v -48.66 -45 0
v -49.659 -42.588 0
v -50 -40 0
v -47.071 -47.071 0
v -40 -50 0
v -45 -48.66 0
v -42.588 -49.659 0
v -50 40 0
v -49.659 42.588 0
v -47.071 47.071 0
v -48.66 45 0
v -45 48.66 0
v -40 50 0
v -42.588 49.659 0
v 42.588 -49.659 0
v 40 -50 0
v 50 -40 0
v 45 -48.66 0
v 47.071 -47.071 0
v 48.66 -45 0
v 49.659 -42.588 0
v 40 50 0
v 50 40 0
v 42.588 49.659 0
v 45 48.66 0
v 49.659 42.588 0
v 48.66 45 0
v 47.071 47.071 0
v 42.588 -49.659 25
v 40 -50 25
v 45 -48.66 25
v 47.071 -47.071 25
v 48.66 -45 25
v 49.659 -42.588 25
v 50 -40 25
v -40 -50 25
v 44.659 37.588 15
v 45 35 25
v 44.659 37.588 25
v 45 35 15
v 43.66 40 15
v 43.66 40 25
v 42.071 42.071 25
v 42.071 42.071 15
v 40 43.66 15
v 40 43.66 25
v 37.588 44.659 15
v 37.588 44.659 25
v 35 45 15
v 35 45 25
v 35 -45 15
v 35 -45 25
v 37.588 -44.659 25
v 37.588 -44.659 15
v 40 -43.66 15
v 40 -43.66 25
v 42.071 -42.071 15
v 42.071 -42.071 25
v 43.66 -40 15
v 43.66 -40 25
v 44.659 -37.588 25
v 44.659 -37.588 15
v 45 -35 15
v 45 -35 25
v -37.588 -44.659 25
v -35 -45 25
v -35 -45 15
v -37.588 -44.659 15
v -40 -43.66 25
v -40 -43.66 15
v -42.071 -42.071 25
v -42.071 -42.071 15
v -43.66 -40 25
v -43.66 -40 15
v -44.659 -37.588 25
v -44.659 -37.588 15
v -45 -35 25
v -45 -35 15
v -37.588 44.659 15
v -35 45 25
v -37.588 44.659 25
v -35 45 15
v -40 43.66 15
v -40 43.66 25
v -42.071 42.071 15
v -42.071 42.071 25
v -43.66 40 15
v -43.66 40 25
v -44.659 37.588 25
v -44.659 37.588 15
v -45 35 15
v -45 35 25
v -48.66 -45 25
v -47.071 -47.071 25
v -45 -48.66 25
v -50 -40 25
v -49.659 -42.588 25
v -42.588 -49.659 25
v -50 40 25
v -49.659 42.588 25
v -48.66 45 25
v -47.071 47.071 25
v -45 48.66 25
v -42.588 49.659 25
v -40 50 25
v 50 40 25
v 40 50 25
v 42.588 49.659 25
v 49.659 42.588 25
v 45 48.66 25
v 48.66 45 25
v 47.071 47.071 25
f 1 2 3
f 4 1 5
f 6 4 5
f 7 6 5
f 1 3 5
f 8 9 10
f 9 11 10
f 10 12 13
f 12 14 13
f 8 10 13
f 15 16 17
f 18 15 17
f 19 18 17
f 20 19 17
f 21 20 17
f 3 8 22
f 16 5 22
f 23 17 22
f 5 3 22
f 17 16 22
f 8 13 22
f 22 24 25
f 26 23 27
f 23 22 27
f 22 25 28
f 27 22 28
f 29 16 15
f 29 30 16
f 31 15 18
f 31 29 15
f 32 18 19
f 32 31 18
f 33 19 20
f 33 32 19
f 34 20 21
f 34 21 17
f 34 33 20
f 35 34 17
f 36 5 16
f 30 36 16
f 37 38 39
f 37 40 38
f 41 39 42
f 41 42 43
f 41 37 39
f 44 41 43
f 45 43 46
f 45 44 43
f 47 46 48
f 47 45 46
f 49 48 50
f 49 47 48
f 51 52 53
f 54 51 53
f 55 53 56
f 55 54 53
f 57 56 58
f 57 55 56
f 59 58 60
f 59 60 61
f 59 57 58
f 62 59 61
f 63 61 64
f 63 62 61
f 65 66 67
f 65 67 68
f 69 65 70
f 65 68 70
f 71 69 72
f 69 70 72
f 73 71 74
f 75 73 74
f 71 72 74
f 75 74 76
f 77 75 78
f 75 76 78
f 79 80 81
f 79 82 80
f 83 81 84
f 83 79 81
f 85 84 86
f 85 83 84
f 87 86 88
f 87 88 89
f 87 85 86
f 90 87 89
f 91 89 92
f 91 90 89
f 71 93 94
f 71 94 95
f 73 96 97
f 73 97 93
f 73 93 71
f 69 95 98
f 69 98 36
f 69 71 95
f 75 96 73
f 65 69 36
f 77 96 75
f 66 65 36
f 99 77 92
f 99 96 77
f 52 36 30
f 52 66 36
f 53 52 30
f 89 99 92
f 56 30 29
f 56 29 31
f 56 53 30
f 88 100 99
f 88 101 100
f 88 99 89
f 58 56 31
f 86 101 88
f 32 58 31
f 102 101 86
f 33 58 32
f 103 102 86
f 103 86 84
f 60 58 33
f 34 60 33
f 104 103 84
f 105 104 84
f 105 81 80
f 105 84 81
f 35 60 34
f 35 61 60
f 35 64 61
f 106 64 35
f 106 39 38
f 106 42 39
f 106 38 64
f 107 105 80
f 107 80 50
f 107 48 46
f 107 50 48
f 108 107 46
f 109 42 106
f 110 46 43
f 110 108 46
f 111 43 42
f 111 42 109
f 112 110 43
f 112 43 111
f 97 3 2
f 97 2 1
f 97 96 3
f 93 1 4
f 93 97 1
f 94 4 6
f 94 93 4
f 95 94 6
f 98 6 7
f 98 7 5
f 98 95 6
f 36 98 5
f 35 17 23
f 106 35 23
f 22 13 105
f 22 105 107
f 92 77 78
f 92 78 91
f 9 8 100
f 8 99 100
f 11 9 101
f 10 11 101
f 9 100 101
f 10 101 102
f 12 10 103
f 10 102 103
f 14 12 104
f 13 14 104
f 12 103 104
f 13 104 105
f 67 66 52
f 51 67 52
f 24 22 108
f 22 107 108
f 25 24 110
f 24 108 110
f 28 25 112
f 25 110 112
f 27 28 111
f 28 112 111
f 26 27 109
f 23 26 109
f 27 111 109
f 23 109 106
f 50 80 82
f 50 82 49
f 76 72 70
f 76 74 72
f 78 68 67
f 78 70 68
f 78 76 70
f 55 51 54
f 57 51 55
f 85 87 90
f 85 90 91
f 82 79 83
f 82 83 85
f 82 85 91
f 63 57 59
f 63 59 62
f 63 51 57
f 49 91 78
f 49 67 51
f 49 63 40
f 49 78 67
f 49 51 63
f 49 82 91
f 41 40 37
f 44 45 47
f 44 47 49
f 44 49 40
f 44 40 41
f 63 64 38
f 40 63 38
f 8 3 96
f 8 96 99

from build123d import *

# Parameters (mm, degrees)
F0_W     = 100
F0_H     = 100
F1_DEPTH = 25
F2_W     = 90
F2_H     = 90
F3_DEPTH = 10
F4_R     = 10


with BuildPart() as f1:
    # F0 (on Top) → F1 (new body)
    with BuildSketch(Plane.XY):
        Rectangle(F0_W, F0_H)
    extrude(amount=F1_DEPTH)

    # F2 (on face) → F3 (cut)
    with BuildSketch(Plane.XY.offset(25)):
        Rectangle(F2_W, F2_H)
    extrude(amount=-F3_DEPTH, mode=Mode.SUBTRACT)

    # F4
    f4_edges = [f1.edges().sort_by_distance(p)[0] for p in [
        (50, 50, 12.5),
        (45, 45, 20),
        (-45, 45, 20),
        (-50, 50, 12.5),
        (-50, -50, 12.5),
        (-45, -45, 20),
        (50, -50, 12.5),
        (45, -45, 20),
    ]]
    fillet(f4_edges, radius=F4_R)


solid = f1.part
